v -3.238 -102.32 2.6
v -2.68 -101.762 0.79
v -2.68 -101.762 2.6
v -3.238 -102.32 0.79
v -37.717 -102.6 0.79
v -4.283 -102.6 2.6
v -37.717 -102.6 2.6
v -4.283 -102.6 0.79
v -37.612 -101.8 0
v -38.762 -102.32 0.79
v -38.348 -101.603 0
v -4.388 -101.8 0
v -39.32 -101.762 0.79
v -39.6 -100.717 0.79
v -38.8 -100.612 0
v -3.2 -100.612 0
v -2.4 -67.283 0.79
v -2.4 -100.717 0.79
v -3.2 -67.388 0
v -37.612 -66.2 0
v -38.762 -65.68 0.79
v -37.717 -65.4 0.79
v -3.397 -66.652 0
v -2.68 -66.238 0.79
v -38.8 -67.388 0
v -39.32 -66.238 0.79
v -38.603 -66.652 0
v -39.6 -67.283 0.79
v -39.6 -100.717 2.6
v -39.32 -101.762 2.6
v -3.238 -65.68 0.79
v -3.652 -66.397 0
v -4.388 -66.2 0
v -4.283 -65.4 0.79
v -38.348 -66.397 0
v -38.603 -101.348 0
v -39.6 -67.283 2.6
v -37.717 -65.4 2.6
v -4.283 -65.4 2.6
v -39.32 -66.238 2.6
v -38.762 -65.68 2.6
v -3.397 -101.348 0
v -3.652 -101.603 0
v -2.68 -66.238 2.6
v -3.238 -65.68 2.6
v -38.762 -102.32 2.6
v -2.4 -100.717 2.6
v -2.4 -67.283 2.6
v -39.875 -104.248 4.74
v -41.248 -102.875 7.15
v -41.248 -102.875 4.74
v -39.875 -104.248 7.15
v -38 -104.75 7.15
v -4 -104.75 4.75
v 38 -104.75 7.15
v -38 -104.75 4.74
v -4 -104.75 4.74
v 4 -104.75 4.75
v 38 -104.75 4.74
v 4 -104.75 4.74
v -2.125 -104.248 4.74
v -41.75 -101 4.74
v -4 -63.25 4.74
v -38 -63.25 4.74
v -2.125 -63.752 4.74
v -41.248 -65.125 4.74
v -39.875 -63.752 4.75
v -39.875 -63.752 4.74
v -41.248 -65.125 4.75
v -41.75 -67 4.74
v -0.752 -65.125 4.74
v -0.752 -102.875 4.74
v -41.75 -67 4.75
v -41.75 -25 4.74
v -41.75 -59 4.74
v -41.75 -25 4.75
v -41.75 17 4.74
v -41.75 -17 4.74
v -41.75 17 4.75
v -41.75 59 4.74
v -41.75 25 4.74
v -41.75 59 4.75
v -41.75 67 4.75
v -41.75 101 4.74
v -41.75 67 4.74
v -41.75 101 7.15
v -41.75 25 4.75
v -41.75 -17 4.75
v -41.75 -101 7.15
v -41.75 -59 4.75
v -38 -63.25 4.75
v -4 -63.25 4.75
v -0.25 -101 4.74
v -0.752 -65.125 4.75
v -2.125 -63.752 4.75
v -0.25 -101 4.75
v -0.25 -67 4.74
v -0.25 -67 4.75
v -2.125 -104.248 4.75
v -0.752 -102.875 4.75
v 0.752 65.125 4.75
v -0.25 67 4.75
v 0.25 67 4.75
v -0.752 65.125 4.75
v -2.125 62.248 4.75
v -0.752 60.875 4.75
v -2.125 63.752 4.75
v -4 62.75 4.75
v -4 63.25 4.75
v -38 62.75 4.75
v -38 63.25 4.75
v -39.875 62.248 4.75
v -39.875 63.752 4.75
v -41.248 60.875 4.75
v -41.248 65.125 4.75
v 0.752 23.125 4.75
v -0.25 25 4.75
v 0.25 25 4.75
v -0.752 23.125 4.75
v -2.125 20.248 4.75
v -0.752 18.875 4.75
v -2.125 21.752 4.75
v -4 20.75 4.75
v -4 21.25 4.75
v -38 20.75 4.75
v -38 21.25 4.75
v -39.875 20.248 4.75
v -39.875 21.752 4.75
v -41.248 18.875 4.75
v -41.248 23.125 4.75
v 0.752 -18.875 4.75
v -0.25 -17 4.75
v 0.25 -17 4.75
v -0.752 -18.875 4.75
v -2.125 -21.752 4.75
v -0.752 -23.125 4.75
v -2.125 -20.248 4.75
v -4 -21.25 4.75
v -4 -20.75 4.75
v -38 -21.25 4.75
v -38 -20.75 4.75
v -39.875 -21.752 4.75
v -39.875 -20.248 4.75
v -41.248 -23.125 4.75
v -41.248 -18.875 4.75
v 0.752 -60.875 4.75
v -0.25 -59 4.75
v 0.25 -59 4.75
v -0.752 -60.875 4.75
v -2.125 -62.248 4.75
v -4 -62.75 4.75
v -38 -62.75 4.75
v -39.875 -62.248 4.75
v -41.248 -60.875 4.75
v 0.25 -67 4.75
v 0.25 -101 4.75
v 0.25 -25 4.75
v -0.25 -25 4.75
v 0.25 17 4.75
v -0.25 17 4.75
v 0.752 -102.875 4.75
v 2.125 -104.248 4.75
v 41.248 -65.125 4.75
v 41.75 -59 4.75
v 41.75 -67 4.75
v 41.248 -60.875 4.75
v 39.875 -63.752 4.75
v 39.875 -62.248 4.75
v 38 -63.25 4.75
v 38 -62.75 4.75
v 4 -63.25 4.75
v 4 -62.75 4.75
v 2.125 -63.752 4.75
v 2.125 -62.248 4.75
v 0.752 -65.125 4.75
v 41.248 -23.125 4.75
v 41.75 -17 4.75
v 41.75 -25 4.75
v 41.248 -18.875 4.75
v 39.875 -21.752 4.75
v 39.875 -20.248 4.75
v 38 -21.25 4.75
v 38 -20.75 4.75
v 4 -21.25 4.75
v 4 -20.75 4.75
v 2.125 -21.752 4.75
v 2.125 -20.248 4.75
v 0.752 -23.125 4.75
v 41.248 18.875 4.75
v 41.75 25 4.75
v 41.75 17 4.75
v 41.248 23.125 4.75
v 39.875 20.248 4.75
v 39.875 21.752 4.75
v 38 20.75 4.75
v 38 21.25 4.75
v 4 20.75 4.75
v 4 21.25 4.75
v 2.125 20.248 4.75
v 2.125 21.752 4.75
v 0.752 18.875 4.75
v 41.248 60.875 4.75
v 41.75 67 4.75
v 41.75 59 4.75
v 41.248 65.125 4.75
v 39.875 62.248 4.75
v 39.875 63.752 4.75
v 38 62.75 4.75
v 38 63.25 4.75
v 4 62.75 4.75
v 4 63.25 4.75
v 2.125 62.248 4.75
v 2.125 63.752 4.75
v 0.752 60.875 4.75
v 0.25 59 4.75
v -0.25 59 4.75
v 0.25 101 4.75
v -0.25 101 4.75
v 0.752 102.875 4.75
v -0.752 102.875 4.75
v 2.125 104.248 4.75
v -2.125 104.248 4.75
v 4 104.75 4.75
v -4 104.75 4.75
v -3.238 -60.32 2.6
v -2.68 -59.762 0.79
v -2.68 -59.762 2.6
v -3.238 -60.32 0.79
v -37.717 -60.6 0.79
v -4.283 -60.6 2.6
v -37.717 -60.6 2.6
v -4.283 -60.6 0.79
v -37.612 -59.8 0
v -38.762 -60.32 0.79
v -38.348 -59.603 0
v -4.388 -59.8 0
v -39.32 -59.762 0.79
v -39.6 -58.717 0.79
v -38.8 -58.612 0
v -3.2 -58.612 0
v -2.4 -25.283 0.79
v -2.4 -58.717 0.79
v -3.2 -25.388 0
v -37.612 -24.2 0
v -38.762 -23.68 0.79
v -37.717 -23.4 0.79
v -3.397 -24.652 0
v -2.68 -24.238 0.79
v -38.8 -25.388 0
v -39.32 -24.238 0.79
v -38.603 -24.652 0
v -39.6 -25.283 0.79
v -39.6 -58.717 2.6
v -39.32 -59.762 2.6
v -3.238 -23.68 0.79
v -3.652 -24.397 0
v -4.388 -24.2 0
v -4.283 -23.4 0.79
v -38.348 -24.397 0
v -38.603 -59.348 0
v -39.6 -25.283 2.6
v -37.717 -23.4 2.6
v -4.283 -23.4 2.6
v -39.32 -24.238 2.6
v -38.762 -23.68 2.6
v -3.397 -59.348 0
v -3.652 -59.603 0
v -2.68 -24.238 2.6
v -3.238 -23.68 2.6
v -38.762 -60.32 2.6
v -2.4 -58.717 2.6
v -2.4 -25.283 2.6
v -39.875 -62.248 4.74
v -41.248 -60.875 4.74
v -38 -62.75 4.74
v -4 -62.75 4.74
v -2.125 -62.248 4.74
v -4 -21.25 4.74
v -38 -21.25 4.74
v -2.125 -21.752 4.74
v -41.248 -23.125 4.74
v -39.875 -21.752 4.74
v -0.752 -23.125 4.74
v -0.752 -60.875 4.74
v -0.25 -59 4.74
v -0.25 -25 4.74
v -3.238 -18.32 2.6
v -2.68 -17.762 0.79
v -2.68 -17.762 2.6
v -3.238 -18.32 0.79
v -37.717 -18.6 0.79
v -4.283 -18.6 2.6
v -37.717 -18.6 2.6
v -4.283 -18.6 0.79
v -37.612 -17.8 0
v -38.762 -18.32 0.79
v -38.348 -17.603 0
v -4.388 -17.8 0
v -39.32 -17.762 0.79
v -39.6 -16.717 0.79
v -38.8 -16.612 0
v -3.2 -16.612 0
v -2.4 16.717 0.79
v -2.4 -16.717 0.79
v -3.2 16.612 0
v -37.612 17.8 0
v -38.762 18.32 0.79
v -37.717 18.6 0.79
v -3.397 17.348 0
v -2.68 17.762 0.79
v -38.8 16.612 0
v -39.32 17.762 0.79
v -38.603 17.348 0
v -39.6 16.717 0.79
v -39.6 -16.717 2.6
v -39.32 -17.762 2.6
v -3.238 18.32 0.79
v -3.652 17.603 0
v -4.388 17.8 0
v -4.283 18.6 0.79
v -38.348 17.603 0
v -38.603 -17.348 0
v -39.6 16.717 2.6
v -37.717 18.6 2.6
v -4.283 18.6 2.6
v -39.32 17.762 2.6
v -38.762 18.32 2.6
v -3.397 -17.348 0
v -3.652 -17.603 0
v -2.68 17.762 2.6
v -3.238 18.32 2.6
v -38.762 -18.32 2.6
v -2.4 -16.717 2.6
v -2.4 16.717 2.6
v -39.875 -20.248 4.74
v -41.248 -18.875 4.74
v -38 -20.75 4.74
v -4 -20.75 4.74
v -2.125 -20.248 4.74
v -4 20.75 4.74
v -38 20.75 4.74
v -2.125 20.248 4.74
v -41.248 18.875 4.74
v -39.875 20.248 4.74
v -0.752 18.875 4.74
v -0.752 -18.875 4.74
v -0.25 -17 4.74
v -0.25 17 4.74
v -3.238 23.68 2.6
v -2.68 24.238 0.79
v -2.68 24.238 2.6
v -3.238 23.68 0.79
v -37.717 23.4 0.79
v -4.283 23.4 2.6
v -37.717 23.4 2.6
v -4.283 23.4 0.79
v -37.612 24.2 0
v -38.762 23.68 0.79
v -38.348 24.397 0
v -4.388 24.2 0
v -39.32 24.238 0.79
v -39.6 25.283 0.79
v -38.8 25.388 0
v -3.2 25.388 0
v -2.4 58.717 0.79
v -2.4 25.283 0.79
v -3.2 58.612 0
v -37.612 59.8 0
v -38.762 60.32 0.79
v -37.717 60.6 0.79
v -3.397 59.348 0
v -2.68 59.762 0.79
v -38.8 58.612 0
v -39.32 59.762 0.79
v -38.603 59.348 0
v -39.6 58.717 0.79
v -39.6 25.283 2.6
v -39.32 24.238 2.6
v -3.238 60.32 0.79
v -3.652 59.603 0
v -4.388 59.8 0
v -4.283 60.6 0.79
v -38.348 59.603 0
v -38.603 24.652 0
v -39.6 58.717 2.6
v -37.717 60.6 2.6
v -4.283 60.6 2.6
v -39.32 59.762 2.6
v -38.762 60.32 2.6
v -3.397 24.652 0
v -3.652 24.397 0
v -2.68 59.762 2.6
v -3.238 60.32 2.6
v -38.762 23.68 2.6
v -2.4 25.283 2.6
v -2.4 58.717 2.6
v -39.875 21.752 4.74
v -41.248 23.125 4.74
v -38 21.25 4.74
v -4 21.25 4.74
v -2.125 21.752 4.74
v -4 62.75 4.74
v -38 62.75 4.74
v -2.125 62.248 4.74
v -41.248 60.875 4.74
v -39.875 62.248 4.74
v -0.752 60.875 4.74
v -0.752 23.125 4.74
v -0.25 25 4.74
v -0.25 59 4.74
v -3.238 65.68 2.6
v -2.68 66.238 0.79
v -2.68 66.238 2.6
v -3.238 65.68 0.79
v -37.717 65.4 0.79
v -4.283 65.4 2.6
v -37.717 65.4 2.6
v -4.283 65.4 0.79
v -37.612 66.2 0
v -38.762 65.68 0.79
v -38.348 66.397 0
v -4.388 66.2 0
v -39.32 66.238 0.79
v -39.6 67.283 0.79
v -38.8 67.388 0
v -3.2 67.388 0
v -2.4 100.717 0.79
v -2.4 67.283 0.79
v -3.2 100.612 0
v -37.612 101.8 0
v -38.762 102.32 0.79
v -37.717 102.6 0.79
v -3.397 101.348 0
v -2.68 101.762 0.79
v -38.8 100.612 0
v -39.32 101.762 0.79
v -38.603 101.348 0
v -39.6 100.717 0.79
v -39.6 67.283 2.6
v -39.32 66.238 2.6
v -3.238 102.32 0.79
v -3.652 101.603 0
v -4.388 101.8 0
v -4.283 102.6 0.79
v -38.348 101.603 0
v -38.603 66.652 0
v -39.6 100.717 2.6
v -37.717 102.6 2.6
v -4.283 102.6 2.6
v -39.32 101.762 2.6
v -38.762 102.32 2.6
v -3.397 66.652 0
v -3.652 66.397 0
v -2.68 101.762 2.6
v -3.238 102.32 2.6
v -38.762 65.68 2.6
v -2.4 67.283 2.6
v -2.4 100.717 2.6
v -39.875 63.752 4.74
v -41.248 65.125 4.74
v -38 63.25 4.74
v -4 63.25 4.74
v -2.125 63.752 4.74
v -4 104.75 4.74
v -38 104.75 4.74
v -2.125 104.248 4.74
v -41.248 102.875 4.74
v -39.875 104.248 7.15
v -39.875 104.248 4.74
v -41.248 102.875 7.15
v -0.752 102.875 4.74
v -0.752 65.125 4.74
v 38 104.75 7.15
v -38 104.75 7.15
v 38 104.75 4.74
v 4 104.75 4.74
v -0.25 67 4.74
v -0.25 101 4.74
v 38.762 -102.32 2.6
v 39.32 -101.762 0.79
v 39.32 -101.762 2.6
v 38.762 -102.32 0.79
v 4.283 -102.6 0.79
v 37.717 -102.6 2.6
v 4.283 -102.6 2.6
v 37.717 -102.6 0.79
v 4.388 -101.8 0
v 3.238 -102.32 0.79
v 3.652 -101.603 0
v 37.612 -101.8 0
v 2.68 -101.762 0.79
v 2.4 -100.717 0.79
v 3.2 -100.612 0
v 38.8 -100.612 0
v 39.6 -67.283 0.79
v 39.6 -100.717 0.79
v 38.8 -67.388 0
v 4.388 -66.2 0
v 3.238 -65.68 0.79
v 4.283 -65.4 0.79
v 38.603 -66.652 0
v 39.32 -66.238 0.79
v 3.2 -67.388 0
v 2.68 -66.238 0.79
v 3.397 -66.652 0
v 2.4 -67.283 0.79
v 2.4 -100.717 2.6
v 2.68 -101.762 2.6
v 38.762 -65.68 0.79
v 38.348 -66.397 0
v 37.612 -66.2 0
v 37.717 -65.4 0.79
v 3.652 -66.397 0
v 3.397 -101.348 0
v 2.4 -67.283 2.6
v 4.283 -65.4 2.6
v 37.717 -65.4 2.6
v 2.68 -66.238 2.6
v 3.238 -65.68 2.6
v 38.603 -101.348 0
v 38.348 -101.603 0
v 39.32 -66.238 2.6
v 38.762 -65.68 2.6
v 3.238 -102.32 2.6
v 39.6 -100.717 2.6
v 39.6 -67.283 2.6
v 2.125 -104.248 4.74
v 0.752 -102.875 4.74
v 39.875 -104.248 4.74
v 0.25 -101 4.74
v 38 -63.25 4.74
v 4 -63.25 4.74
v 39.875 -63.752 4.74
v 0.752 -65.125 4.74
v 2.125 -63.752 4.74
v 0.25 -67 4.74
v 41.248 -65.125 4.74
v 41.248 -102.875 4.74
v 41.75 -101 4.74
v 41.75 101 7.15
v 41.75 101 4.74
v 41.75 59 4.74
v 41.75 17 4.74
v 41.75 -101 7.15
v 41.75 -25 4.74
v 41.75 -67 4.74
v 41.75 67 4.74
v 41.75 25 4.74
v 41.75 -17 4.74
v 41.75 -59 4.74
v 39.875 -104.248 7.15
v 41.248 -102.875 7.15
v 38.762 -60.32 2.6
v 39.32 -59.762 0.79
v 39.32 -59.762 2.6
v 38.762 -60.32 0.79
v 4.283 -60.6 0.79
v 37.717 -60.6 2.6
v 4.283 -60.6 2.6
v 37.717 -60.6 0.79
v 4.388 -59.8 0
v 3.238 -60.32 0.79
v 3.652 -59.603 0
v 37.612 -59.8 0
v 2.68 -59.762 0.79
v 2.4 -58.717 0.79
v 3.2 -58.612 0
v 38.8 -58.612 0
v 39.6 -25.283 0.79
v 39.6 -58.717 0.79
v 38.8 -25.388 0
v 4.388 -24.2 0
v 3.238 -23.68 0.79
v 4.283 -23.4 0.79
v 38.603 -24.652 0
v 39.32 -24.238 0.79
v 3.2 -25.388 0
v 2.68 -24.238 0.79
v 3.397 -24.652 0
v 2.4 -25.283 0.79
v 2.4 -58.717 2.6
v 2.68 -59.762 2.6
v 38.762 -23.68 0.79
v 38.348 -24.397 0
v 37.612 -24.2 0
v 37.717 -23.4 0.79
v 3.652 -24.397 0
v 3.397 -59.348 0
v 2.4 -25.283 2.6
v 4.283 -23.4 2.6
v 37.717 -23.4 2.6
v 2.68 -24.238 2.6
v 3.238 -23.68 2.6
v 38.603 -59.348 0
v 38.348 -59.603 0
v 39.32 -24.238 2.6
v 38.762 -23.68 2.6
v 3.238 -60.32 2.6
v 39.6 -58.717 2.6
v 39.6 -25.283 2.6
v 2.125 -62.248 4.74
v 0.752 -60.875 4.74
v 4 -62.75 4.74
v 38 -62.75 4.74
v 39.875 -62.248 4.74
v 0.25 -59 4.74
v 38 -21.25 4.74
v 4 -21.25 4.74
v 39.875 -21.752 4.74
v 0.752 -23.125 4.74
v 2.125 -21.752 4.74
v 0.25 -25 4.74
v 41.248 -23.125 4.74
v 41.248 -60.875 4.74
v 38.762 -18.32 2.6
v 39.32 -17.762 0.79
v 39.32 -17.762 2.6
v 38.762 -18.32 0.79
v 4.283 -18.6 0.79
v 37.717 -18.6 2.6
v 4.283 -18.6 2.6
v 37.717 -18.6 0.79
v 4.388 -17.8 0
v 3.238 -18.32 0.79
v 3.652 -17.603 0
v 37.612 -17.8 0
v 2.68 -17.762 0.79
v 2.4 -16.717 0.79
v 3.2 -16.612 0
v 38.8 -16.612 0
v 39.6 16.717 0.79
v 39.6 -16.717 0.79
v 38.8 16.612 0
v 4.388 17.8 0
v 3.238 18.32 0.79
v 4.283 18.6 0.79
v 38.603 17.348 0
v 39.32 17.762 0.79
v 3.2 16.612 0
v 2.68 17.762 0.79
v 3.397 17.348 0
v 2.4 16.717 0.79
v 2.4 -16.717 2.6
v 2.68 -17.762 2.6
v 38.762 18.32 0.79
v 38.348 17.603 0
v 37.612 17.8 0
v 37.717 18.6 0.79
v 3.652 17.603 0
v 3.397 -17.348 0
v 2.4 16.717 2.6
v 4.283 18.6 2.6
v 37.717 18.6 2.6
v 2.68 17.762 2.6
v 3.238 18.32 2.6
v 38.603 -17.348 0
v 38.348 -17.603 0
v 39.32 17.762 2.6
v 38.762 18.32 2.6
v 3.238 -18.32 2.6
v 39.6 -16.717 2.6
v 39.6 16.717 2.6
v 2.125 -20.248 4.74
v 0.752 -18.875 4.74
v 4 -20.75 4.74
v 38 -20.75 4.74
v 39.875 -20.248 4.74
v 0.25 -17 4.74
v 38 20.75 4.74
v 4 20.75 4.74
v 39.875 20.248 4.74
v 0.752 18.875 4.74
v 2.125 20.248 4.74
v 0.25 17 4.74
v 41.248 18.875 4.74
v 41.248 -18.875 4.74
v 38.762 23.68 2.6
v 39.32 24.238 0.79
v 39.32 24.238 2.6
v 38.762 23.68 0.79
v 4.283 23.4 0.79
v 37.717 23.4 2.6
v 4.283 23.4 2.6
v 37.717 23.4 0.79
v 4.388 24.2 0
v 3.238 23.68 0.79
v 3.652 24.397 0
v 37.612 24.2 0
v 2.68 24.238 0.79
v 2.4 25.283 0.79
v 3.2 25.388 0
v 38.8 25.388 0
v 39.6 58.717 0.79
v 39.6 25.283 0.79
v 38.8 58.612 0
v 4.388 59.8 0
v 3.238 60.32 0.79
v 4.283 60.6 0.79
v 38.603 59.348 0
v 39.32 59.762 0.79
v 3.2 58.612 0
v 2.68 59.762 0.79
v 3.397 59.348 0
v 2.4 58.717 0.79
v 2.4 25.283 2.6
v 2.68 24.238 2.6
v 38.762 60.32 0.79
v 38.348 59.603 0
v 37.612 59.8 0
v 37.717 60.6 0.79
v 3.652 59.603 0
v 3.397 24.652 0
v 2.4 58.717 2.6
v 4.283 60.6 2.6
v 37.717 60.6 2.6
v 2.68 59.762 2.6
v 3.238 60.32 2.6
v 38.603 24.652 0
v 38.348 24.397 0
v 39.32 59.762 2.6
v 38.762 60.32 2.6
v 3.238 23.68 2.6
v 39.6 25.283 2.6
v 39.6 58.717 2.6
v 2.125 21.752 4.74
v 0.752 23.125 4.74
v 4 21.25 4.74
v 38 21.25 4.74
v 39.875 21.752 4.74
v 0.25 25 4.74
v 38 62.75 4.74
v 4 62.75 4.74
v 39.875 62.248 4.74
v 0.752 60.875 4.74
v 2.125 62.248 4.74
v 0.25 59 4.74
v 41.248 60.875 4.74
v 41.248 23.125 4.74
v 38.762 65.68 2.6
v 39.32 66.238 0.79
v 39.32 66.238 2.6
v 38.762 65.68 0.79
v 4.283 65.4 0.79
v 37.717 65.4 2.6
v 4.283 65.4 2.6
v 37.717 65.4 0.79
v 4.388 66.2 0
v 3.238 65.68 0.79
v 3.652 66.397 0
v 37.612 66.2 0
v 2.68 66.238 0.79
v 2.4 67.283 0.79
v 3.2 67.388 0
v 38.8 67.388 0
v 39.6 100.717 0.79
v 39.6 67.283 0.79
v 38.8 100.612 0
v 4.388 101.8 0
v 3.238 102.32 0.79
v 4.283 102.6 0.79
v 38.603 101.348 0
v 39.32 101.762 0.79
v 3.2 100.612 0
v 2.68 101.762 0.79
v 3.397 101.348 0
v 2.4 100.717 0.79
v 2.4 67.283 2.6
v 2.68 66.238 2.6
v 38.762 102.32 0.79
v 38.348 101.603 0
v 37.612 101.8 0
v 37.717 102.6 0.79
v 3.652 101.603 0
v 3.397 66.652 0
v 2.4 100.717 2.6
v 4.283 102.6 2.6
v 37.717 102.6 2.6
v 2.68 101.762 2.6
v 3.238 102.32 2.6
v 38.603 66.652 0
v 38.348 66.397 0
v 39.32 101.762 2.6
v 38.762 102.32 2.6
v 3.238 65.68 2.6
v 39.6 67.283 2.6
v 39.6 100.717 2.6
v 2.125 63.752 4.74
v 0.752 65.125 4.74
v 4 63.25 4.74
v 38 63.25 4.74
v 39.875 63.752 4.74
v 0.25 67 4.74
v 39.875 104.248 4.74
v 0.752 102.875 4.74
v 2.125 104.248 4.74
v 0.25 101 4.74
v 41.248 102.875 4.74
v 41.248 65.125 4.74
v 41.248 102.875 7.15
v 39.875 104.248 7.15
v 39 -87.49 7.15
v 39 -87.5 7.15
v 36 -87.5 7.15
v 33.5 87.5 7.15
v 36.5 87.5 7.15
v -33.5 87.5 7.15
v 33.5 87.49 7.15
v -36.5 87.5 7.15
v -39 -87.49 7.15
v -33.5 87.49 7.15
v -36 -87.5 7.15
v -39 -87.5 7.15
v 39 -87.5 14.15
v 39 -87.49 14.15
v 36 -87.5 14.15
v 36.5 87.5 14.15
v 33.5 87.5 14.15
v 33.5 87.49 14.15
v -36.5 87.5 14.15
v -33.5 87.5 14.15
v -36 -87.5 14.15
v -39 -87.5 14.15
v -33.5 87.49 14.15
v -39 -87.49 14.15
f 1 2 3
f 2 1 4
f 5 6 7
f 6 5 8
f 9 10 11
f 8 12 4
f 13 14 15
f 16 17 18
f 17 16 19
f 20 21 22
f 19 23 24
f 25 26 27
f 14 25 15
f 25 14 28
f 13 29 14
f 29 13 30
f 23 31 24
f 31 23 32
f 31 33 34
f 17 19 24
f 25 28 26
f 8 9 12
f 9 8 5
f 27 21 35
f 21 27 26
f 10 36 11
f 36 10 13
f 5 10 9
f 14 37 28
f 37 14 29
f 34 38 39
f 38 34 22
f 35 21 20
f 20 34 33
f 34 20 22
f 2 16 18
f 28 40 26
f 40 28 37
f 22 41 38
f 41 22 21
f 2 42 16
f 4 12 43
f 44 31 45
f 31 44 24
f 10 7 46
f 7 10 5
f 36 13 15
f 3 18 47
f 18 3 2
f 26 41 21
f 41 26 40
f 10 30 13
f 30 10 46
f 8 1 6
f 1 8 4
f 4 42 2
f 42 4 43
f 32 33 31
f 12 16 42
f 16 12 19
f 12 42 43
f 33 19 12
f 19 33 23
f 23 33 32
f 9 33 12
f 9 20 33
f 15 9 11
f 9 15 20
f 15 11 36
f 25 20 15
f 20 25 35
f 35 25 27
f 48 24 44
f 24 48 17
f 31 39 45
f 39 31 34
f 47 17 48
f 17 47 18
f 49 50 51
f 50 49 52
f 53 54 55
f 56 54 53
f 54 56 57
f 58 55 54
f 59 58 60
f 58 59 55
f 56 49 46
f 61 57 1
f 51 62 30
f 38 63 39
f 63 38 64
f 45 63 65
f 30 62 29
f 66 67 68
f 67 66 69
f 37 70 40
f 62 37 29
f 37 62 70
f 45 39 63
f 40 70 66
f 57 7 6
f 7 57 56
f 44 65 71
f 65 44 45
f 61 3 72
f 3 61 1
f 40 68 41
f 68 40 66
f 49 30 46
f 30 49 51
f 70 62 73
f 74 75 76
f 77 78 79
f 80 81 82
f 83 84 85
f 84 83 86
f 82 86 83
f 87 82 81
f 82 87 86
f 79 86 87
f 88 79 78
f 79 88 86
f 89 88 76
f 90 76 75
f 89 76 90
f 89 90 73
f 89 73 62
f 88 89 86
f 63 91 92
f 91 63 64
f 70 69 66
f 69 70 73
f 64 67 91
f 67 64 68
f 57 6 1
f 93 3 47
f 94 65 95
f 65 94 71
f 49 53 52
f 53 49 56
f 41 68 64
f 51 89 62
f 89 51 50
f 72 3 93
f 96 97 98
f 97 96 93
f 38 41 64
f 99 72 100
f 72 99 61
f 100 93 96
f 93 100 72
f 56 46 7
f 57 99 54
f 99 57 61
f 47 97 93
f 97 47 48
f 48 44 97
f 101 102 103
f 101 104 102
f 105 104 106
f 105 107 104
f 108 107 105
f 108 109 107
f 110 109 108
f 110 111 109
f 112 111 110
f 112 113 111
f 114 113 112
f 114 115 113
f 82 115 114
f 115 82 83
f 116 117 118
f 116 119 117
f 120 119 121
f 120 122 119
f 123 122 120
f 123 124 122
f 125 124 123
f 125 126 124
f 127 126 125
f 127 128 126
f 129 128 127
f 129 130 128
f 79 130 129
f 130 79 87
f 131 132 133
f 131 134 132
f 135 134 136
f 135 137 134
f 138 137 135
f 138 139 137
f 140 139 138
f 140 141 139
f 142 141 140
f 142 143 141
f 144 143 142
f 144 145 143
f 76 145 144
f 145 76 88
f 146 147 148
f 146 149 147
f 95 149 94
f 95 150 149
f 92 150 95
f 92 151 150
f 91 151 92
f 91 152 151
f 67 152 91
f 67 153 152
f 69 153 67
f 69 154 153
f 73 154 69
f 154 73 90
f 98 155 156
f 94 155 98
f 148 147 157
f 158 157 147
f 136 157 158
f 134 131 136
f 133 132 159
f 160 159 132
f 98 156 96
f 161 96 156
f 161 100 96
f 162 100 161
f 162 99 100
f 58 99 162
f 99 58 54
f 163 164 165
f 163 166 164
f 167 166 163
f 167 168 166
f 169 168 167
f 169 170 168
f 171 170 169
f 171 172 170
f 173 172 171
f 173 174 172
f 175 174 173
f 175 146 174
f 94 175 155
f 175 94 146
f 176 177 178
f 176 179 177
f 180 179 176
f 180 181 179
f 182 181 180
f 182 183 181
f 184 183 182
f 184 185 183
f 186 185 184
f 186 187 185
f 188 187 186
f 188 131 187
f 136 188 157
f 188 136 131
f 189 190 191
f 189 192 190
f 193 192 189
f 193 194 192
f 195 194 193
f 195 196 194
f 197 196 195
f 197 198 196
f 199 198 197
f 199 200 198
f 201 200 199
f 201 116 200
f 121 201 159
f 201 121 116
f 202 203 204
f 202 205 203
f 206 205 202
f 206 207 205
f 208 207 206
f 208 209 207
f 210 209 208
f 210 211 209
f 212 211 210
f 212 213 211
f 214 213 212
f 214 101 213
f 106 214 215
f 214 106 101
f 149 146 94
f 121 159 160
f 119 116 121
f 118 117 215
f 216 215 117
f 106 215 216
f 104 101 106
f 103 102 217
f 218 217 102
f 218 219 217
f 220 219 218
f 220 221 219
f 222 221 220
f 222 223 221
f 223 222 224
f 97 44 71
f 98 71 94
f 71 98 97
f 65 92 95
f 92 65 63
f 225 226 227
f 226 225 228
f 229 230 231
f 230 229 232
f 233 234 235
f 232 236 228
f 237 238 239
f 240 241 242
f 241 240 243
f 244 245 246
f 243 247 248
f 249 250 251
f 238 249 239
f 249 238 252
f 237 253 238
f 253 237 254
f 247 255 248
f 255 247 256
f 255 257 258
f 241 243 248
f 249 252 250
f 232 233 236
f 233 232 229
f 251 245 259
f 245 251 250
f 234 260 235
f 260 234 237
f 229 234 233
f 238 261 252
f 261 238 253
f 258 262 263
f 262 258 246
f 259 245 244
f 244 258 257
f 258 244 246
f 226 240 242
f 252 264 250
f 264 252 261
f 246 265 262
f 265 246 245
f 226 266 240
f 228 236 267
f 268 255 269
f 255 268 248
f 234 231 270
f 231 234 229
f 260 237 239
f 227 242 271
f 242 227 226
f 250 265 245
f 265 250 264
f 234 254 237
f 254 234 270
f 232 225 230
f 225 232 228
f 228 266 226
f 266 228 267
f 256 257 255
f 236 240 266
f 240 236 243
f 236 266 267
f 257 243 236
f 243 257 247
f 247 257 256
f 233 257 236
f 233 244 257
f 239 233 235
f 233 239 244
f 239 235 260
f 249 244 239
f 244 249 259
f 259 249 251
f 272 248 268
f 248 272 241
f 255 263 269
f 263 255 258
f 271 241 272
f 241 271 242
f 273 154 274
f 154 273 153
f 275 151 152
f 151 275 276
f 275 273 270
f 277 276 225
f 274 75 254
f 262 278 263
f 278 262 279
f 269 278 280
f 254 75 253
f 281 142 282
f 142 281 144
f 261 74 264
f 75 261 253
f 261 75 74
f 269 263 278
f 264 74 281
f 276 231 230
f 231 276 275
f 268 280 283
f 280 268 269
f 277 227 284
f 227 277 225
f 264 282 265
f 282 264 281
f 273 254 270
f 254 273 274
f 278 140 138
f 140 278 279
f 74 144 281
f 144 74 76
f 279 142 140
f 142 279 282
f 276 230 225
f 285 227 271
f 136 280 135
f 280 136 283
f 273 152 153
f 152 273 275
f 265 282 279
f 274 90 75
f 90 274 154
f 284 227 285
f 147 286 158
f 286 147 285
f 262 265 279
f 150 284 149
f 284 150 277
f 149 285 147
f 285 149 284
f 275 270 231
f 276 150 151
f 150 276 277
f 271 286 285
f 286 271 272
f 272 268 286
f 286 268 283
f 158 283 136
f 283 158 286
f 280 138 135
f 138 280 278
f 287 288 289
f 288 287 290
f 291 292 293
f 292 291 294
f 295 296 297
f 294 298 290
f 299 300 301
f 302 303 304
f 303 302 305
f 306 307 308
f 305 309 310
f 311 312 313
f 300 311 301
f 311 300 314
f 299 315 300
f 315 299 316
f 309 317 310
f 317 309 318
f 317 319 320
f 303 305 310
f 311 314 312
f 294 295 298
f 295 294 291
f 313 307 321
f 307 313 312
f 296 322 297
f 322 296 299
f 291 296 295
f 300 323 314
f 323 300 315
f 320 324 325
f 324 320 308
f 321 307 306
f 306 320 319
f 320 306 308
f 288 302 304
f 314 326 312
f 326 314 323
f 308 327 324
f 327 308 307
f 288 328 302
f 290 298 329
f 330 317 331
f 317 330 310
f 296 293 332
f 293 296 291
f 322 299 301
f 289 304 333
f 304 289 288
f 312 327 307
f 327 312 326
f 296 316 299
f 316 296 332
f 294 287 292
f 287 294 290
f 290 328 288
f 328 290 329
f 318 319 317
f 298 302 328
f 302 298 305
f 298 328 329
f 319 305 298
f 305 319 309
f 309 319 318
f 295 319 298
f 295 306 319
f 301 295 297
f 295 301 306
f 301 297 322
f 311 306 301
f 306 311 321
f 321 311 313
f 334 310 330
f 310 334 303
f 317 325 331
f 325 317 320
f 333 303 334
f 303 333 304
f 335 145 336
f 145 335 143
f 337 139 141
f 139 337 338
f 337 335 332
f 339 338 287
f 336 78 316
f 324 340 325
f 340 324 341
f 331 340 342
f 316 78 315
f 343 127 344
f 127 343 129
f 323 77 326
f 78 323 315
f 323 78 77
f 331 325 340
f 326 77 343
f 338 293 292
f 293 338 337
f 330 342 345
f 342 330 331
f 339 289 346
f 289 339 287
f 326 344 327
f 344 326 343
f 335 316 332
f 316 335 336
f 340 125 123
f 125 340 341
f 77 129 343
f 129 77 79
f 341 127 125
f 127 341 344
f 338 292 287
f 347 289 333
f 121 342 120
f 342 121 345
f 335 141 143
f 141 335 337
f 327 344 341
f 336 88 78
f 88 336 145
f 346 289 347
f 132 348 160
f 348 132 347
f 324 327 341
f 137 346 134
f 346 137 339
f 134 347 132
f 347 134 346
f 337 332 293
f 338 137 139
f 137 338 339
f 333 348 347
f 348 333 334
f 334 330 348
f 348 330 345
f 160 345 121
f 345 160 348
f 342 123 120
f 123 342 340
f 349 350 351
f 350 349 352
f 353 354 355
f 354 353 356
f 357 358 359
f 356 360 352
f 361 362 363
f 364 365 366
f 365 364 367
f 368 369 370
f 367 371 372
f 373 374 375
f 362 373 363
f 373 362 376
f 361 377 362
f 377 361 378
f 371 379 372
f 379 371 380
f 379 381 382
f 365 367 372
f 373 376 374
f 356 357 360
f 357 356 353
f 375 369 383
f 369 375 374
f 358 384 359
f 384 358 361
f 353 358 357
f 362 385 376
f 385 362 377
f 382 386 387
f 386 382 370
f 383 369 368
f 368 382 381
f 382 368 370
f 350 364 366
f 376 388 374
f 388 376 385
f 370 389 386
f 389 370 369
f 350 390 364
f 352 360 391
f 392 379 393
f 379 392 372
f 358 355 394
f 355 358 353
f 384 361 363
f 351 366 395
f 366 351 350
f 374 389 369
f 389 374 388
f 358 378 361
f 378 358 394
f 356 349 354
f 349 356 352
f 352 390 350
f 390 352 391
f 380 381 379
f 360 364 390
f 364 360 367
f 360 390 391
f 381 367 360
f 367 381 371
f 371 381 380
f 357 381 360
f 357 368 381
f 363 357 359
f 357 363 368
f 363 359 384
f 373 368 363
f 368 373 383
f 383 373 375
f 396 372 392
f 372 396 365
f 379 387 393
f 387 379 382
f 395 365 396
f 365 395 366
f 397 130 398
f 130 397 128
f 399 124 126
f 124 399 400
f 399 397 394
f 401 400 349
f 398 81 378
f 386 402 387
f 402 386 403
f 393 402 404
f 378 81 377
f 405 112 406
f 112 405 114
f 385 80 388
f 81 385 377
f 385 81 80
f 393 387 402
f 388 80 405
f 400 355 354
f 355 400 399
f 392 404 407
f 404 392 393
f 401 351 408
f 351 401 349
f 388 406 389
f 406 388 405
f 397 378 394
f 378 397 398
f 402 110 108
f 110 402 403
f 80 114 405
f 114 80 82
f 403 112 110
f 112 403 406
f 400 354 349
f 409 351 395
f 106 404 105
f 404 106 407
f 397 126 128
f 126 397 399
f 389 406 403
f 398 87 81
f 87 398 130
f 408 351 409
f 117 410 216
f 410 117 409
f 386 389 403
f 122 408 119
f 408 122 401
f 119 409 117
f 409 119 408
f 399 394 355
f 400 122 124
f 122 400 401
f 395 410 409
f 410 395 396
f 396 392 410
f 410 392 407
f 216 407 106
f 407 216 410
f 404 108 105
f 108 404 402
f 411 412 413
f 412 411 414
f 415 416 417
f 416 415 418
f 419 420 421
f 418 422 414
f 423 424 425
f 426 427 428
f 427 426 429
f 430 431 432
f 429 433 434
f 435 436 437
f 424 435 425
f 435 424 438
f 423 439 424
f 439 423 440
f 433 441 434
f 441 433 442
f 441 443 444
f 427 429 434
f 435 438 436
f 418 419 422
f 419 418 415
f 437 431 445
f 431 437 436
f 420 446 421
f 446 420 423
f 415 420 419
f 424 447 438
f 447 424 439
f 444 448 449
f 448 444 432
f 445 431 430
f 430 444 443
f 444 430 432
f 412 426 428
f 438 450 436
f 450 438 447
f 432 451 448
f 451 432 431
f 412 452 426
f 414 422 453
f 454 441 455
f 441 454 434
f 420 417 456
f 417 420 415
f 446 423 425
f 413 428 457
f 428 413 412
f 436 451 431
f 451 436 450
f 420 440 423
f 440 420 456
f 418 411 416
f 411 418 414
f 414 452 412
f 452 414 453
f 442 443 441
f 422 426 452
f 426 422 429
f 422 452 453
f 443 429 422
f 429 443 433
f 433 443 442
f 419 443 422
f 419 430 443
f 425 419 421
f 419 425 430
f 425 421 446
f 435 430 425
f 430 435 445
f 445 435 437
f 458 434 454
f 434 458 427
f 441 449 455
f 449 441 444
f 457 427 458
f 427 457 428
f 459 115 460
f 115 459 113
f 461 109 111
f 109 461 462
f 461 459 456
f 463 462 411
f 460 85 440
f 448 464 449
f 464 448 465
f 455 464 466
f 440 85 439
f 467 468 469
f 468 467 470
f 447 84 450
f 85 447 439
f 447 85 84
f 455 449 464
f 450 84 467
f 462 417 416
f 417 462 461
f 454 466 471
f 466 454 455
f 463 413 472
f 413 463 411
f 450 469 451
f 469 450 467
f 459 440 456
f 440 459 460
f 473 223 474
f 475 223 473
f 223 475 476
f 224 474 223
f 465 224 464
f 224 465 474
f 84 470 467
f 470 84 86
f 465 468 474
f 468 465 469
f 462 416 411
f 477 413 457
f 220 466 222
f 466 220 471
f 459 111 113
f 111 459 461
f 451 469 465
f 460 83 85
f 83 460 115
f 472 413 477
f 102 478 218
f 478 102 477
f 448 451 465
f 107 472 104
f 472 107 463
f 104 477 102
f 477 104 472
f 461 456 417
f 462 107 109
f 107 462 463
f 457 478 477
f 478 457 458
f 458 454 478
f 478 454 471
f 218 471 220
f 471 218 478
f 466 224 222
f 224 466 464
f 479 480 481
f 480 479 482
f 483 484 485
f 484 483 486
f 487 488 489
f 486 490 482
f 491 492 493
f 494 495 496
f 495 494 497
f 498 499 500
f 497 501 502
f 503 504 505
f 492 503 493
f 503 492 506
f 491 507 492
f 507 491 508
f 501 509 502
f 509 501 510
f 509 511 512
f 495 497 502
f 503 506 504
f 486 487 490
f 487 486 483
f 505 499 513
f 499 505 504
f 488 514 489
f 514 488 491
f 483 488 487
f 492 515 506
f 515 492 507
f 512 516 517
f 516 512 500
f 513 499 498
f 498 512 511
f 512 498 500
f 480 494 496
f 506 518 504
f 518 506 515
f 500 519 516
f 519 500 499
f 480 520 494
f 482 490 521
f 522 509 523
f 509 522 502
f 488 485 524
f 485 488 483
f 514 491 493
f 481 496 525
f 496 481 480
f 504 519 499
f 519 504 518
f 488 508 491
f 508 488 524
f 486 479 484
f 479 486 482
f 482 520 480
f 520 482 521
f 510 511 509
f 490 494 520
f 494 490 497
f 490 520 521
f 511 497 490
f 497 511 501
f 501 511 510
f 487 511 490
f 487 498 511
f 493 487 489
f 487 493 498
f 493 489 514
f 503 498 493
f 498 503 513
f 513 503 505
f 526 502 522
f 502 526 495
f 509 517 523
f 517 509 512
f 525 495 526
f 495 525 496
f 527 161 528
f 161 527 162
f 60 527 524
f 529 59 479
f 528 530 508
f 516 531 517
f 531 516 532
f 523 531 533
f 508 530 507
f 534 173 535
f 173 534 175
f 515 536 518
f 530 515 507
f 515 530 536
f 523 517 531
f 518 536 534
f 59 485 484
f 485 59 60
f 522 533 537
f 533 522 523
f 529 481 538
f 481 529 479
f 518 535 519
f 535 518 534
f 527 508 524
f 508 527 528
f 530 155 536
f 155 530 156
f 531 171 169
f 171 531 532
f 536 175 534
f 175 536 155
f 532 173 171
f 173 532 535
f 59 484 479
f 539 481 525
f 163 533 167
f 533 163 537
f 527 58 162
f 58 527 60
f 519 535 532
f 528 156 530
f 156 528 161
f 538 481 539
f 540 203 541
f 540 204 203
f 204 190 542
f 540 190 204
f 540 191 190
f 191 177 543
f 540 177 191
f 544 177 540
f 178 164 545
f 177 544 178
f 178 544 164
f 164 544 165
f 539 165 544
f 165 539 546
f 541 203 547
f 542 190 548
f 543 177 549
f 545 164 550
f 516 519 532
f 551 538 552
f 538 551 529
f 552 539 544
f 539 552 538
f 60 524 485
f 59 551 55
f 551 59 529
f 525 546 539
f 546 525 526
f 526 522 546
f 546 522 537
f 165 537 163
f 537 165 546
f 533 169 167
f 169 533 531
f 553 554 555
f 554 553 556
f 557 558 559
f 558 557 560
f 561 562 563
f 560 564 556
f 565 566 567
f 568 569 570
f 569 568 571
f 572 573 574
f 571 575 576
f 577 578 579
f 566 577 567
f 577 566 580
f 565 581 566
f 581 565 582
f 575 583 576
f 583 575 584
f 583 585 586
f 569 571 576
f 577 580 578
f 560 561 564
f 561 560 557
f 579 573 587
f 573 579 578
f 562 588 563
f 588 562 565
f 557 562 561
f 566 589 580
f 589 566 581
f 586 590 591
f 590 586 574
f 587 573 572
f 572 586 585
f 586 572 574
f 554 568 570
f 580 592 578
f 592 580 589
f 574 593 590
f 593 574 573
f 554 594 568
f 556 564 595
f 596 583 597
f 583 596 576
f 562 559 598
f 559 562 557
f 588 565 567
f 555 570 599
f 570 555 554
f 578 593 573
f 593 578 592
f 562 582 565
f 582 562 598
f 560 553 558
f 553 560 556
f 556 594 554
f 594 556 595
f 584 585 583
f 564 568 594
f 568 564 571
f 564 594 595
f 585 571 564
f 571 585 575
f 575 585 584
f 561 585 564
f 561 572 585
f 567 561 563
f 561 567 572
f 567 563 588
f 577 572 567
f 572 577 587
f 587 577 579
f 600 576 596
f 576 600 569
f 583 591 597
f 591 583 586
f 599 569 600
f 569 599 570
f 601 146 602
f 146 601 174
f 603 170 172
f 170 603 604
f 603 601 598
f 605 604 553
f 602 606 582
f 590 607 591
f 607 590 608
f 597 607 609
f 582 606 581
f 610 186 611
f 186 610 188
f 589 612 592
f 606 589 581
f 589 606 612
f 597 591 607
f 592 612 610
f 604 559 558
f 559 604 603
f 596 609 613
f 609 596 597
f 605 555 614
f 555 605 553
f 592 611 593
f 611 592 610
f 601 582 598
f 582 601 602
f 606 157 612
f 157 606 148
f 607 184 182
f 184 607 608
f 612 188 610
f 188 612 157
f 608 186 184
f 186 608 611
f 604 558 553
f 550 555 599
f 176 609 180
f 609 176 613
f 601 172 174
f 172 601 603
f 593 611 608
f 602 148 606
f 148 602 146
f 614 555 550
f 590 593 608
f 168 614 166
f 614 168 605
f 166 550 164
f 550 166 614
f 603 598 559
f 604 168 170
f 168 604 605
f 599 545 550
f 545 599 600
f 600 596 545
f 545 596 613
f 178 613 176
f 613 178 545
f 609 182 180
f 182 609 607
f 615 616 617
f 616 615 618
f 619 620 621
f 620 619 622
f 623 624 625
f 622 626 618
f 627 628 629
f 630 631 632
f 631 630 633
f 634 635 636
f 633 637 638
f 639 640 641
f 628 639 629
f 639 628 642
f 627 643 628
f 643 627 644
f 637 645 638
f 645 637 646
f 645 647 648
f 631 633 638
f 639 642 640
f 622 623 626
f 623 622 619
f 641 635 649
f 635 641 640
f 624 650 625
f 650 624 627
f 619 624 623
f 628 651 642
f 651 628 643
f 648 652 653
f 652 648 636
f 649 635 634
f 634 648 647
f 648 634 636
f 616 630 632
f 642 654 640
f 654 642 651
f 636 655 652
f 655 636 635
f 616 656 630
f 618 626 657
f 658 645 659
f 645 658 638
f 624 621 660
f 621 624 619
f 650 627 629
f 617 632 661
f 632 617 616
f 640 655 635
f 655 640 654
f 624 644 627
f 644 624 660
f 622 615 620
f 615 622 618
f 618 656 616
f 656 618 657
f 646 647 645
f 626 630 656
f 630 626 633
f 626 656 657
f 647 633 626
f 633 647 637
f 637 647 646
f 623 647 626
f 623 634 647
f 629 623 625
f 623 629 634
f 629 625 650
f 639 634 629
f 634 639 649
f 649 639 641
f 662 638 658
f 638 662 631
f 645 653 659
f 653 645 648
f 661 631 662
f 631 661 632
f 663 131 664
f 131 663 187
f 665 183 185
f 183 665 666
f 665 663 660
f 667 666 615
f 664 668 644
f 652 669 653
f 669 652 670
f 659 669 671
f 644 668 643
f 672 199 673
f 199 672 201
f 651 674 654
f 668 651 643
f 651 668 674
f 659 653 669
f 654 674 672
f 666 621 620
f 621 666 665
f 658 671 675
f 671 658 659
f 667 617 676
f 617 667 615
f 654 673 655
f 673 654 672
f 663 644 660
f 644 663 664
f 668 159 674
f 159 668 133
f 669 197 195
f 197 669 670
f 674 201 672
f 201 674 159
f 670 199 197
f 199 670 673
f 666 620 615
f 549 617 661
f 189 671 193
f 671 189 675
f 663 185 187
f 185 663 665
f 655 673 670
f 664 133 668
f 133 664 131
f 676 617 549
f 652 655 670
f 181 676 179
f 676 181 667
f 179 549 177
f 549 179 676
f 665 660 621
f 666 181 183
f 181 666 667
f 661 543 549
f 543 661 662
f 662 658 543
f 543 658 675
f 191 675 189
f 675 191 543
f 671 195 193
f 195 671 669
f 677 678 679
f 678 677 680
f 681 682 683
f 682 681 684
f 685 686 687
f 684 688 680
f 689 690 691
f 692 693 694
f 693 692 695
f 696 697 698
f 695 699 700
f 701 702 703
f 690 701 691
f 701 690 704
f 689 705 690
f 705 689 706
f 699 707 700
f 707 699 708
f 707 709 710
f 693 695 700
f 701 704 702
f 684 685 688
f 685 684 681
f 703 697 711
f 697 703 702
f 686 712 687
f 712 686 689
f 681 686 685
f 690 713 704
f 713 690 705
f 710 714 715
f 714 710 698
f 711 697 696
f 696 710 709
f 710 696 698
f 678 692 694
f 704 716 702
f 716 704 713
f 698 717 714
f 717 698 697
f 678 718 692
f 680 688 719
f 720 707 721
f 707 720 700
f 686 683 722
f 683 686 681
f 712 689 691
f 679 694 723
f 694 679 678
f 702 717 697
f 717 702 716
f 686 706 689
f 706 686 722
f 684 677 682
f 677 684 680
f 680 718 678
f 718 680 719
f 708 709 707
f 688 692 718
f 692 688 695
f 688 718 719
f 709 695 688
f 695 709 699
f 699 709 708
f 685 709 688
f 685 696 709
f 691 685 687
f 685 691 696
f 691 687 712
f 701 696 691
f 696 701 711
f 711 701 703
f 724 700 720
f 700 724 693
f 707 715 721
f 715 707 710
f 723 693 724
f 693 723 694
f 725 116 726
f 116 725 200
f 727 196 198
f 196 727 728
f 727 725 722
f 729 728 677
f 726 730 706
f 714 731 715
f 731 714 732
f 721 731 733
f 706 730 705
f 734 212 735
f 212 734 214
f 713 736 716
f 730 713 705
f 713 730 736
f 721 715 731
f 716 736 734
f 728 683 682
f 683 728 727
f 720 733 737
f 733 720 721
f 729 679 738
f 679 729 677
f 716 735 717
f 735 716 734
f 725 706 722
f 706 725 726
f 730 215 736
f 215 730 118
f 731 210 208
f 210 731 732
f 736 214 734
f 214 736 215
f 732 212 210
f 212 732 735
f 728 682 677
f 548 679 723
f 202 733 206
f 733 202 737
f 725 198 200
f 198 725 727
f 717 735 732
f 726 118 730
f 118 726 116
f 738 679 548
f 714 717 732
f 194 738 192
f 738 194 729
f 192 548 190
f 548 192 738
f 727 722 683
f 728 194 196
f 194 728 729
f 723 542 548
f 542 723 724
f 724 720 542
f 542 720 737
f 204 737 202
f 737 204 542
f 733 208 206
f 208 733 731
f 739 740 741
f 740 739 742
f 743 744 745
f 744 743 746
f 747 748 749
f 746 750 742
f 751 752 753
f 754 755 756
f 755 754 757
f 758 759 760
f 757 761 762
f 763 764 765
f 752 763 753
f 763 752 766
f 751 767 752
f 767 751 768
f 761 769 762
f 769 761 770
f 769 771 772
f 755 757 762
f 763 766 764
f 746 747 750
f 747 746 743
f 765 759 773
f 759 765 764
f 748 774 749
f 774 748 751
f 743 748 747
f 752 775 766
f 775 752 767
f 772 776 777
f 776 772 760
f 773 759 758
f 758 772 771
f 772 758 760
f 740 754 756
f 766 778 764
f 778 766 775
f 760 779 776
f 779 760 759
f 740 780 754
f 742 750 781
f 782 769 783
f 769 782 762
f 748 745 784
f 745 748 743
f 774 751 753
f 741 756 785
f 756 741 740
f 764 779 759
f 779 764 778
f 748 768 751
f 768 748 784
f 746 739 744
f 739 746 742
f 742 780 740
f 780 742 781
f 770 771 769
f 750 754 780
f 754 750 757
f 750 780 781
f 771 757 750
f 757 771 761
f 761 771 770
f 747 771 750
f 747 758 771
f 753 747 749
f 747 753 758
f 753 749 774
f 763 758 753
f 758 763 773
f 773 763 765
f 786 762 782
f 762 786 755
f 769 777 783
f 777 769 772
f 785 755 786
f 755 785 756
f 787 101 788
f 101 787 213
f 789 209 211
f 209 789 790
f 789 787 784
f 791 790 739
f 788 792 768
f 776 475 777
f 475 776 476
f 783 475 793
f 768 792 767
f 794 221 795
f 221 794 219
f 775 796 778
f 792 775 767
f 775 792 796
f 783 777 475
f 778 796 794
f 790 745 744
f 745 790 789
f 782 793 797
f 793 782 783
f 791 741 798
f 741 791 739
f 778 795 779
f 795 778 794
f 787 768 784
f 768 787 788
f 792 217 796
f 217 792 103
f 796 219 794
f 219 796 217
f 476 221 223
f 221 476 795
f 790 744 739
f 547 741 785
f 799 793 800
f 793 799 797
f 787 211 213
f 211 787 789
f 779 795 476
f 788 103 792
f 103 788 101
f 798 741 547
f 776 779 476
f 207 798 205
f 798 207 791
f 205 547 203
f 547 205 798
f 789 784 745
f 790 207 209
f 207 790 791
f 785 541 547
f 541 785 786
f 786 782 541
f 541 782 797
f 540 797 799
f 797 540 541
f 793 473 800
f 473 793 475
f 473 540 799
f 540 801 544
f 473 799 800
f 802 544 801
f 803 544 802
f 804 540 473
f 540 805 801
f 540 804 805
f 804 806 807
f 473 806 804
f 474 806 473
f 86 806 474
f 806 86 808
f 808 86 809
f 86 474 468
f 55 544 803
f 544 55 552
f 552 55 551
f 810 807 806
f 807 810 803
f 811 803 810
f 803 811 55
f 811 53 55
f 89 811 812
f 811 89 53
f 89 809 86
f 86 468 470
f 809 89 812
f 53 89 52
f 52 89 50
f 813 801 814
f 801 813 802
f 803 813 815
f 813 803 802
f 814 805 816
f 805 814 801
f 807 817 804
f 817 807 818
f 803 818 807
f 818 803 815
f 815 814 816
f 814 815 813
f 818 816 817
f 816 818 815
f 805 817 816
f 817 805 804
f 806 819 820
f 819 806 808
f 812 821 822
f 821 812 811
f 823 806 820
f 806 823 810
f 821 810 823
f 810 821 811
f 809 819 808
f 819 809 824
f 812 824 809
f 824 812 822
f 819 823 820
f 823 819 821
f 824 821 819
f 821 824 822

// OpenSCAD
// plate_iron_stand — 2×5 plate that anchors the soldering iron / desoldering gun
// stand to the grid.
//
// HOW YOU USE IT:
//   The plate latches into the desk grid. Slide the stand in from the front,
//   between two angled rails. It wedges and stops. Lift it straight out to remove.
//
// RAILS, NOT A POCKET — and this is the whole point. The base is 70 across the
// front, 65 across the rear, 175 long, and the sponge end is a LARGE-RADIUS D
// that three numbers cannot describe. A close-fitting pocket would need that
// radius, and getting it wrong means the stand will not drop in.
//
// Locating on the STRAIGHT SIDES only sidesteps it. The taper itself stops
// fore-aft movement — the stand wedges between converging rails — and both ends
// stay open, so the D never has to be known. Fewer measurements, and the ones
// used are the ones actually taken.
//
// THE PRINTED PART TAKES NO HEAT. The stand's own cradle holds the iron; this
// only stops the stand wandering. Ordinary filament is fine.
//
// PRINT: as emitted, feet down. No supports.
//
// SPDX-License-Identifier: CC-BY-NC-4.0
// Copyright (c) 2026 Aaron Cupp
include <../lib/gridfinity.scad>

/* [Stand base] */
FRONT_W = 70.0;   // measured 2026-08-20 — widest, at the front
REAR_W  = 65.0;   // measured — narrowest, at the rear
LENGTH  = 175.0;  // measured, approximate. Only sets how long the rails run.
CLR     = 1.0;    // [0.5:0.1:3] per side. Small: the taper wants to wedge.

/* [Plate] */
NX = 2; NY = 5;
DECK    = 2.4;    // [1.6:0.2:6] plate thickness under the stand
RAIL_H  = 7.0;    // [4:0.5:15] rail height above the deck
RAIL_T  = 3.0;    // [2:0.5:6] rail thickness

H  = BIN_BASE_H + DECK;
W  = NX*GF - 0.5; D = NY*GF - 0.5;
IW = W - 2*1.2;   ID = D - 2*1.2;
RL = min(LENGTH, ID - 4);          // rails can't run past the interior

assert(FRONT_W + 2*CLR + 2*RAIL_T <= IW,
       str("Rails + stand (", FRONT_W + 2*CLR + 2*RAIL_T, ") exceed the ", IW, " interior."));
echo(str("plate ", W, " x ", D, " x ", H + RAIL_H, "; rails ", RL,
         " long, gap ", FRONT_W + 2*CLR, " front -> ", REAR_W + 2*CLR, " rear"));

// Half-gap at a given y, interpolating the taper front (-) to rear (+).
function halfgap(y) =
    ((FRONT_W + (REAR_W - FRONT_W) * (y + RL/2) / RL) + 2*CLR) / 2;

module rail(side) {
    // a tapered wall: inner face follows the stand, outer face parallel to it
    hull() {
        translate([side * halfgap(-RL/2), -RL/2, H])
            cube([RAIL_T * side, 0.01, RAIL_H], center = false);
        translate([side * halfgap(RL/2), RL/2 - 0.01, H])
            cube([RAIL_T * side, 0.01, RAIL_H], center = false);
    }
}

union() {
    bin_blank(NX, NY, H);
    rail(1);
    mirror([1, 0, 0]) rail(1);
}
